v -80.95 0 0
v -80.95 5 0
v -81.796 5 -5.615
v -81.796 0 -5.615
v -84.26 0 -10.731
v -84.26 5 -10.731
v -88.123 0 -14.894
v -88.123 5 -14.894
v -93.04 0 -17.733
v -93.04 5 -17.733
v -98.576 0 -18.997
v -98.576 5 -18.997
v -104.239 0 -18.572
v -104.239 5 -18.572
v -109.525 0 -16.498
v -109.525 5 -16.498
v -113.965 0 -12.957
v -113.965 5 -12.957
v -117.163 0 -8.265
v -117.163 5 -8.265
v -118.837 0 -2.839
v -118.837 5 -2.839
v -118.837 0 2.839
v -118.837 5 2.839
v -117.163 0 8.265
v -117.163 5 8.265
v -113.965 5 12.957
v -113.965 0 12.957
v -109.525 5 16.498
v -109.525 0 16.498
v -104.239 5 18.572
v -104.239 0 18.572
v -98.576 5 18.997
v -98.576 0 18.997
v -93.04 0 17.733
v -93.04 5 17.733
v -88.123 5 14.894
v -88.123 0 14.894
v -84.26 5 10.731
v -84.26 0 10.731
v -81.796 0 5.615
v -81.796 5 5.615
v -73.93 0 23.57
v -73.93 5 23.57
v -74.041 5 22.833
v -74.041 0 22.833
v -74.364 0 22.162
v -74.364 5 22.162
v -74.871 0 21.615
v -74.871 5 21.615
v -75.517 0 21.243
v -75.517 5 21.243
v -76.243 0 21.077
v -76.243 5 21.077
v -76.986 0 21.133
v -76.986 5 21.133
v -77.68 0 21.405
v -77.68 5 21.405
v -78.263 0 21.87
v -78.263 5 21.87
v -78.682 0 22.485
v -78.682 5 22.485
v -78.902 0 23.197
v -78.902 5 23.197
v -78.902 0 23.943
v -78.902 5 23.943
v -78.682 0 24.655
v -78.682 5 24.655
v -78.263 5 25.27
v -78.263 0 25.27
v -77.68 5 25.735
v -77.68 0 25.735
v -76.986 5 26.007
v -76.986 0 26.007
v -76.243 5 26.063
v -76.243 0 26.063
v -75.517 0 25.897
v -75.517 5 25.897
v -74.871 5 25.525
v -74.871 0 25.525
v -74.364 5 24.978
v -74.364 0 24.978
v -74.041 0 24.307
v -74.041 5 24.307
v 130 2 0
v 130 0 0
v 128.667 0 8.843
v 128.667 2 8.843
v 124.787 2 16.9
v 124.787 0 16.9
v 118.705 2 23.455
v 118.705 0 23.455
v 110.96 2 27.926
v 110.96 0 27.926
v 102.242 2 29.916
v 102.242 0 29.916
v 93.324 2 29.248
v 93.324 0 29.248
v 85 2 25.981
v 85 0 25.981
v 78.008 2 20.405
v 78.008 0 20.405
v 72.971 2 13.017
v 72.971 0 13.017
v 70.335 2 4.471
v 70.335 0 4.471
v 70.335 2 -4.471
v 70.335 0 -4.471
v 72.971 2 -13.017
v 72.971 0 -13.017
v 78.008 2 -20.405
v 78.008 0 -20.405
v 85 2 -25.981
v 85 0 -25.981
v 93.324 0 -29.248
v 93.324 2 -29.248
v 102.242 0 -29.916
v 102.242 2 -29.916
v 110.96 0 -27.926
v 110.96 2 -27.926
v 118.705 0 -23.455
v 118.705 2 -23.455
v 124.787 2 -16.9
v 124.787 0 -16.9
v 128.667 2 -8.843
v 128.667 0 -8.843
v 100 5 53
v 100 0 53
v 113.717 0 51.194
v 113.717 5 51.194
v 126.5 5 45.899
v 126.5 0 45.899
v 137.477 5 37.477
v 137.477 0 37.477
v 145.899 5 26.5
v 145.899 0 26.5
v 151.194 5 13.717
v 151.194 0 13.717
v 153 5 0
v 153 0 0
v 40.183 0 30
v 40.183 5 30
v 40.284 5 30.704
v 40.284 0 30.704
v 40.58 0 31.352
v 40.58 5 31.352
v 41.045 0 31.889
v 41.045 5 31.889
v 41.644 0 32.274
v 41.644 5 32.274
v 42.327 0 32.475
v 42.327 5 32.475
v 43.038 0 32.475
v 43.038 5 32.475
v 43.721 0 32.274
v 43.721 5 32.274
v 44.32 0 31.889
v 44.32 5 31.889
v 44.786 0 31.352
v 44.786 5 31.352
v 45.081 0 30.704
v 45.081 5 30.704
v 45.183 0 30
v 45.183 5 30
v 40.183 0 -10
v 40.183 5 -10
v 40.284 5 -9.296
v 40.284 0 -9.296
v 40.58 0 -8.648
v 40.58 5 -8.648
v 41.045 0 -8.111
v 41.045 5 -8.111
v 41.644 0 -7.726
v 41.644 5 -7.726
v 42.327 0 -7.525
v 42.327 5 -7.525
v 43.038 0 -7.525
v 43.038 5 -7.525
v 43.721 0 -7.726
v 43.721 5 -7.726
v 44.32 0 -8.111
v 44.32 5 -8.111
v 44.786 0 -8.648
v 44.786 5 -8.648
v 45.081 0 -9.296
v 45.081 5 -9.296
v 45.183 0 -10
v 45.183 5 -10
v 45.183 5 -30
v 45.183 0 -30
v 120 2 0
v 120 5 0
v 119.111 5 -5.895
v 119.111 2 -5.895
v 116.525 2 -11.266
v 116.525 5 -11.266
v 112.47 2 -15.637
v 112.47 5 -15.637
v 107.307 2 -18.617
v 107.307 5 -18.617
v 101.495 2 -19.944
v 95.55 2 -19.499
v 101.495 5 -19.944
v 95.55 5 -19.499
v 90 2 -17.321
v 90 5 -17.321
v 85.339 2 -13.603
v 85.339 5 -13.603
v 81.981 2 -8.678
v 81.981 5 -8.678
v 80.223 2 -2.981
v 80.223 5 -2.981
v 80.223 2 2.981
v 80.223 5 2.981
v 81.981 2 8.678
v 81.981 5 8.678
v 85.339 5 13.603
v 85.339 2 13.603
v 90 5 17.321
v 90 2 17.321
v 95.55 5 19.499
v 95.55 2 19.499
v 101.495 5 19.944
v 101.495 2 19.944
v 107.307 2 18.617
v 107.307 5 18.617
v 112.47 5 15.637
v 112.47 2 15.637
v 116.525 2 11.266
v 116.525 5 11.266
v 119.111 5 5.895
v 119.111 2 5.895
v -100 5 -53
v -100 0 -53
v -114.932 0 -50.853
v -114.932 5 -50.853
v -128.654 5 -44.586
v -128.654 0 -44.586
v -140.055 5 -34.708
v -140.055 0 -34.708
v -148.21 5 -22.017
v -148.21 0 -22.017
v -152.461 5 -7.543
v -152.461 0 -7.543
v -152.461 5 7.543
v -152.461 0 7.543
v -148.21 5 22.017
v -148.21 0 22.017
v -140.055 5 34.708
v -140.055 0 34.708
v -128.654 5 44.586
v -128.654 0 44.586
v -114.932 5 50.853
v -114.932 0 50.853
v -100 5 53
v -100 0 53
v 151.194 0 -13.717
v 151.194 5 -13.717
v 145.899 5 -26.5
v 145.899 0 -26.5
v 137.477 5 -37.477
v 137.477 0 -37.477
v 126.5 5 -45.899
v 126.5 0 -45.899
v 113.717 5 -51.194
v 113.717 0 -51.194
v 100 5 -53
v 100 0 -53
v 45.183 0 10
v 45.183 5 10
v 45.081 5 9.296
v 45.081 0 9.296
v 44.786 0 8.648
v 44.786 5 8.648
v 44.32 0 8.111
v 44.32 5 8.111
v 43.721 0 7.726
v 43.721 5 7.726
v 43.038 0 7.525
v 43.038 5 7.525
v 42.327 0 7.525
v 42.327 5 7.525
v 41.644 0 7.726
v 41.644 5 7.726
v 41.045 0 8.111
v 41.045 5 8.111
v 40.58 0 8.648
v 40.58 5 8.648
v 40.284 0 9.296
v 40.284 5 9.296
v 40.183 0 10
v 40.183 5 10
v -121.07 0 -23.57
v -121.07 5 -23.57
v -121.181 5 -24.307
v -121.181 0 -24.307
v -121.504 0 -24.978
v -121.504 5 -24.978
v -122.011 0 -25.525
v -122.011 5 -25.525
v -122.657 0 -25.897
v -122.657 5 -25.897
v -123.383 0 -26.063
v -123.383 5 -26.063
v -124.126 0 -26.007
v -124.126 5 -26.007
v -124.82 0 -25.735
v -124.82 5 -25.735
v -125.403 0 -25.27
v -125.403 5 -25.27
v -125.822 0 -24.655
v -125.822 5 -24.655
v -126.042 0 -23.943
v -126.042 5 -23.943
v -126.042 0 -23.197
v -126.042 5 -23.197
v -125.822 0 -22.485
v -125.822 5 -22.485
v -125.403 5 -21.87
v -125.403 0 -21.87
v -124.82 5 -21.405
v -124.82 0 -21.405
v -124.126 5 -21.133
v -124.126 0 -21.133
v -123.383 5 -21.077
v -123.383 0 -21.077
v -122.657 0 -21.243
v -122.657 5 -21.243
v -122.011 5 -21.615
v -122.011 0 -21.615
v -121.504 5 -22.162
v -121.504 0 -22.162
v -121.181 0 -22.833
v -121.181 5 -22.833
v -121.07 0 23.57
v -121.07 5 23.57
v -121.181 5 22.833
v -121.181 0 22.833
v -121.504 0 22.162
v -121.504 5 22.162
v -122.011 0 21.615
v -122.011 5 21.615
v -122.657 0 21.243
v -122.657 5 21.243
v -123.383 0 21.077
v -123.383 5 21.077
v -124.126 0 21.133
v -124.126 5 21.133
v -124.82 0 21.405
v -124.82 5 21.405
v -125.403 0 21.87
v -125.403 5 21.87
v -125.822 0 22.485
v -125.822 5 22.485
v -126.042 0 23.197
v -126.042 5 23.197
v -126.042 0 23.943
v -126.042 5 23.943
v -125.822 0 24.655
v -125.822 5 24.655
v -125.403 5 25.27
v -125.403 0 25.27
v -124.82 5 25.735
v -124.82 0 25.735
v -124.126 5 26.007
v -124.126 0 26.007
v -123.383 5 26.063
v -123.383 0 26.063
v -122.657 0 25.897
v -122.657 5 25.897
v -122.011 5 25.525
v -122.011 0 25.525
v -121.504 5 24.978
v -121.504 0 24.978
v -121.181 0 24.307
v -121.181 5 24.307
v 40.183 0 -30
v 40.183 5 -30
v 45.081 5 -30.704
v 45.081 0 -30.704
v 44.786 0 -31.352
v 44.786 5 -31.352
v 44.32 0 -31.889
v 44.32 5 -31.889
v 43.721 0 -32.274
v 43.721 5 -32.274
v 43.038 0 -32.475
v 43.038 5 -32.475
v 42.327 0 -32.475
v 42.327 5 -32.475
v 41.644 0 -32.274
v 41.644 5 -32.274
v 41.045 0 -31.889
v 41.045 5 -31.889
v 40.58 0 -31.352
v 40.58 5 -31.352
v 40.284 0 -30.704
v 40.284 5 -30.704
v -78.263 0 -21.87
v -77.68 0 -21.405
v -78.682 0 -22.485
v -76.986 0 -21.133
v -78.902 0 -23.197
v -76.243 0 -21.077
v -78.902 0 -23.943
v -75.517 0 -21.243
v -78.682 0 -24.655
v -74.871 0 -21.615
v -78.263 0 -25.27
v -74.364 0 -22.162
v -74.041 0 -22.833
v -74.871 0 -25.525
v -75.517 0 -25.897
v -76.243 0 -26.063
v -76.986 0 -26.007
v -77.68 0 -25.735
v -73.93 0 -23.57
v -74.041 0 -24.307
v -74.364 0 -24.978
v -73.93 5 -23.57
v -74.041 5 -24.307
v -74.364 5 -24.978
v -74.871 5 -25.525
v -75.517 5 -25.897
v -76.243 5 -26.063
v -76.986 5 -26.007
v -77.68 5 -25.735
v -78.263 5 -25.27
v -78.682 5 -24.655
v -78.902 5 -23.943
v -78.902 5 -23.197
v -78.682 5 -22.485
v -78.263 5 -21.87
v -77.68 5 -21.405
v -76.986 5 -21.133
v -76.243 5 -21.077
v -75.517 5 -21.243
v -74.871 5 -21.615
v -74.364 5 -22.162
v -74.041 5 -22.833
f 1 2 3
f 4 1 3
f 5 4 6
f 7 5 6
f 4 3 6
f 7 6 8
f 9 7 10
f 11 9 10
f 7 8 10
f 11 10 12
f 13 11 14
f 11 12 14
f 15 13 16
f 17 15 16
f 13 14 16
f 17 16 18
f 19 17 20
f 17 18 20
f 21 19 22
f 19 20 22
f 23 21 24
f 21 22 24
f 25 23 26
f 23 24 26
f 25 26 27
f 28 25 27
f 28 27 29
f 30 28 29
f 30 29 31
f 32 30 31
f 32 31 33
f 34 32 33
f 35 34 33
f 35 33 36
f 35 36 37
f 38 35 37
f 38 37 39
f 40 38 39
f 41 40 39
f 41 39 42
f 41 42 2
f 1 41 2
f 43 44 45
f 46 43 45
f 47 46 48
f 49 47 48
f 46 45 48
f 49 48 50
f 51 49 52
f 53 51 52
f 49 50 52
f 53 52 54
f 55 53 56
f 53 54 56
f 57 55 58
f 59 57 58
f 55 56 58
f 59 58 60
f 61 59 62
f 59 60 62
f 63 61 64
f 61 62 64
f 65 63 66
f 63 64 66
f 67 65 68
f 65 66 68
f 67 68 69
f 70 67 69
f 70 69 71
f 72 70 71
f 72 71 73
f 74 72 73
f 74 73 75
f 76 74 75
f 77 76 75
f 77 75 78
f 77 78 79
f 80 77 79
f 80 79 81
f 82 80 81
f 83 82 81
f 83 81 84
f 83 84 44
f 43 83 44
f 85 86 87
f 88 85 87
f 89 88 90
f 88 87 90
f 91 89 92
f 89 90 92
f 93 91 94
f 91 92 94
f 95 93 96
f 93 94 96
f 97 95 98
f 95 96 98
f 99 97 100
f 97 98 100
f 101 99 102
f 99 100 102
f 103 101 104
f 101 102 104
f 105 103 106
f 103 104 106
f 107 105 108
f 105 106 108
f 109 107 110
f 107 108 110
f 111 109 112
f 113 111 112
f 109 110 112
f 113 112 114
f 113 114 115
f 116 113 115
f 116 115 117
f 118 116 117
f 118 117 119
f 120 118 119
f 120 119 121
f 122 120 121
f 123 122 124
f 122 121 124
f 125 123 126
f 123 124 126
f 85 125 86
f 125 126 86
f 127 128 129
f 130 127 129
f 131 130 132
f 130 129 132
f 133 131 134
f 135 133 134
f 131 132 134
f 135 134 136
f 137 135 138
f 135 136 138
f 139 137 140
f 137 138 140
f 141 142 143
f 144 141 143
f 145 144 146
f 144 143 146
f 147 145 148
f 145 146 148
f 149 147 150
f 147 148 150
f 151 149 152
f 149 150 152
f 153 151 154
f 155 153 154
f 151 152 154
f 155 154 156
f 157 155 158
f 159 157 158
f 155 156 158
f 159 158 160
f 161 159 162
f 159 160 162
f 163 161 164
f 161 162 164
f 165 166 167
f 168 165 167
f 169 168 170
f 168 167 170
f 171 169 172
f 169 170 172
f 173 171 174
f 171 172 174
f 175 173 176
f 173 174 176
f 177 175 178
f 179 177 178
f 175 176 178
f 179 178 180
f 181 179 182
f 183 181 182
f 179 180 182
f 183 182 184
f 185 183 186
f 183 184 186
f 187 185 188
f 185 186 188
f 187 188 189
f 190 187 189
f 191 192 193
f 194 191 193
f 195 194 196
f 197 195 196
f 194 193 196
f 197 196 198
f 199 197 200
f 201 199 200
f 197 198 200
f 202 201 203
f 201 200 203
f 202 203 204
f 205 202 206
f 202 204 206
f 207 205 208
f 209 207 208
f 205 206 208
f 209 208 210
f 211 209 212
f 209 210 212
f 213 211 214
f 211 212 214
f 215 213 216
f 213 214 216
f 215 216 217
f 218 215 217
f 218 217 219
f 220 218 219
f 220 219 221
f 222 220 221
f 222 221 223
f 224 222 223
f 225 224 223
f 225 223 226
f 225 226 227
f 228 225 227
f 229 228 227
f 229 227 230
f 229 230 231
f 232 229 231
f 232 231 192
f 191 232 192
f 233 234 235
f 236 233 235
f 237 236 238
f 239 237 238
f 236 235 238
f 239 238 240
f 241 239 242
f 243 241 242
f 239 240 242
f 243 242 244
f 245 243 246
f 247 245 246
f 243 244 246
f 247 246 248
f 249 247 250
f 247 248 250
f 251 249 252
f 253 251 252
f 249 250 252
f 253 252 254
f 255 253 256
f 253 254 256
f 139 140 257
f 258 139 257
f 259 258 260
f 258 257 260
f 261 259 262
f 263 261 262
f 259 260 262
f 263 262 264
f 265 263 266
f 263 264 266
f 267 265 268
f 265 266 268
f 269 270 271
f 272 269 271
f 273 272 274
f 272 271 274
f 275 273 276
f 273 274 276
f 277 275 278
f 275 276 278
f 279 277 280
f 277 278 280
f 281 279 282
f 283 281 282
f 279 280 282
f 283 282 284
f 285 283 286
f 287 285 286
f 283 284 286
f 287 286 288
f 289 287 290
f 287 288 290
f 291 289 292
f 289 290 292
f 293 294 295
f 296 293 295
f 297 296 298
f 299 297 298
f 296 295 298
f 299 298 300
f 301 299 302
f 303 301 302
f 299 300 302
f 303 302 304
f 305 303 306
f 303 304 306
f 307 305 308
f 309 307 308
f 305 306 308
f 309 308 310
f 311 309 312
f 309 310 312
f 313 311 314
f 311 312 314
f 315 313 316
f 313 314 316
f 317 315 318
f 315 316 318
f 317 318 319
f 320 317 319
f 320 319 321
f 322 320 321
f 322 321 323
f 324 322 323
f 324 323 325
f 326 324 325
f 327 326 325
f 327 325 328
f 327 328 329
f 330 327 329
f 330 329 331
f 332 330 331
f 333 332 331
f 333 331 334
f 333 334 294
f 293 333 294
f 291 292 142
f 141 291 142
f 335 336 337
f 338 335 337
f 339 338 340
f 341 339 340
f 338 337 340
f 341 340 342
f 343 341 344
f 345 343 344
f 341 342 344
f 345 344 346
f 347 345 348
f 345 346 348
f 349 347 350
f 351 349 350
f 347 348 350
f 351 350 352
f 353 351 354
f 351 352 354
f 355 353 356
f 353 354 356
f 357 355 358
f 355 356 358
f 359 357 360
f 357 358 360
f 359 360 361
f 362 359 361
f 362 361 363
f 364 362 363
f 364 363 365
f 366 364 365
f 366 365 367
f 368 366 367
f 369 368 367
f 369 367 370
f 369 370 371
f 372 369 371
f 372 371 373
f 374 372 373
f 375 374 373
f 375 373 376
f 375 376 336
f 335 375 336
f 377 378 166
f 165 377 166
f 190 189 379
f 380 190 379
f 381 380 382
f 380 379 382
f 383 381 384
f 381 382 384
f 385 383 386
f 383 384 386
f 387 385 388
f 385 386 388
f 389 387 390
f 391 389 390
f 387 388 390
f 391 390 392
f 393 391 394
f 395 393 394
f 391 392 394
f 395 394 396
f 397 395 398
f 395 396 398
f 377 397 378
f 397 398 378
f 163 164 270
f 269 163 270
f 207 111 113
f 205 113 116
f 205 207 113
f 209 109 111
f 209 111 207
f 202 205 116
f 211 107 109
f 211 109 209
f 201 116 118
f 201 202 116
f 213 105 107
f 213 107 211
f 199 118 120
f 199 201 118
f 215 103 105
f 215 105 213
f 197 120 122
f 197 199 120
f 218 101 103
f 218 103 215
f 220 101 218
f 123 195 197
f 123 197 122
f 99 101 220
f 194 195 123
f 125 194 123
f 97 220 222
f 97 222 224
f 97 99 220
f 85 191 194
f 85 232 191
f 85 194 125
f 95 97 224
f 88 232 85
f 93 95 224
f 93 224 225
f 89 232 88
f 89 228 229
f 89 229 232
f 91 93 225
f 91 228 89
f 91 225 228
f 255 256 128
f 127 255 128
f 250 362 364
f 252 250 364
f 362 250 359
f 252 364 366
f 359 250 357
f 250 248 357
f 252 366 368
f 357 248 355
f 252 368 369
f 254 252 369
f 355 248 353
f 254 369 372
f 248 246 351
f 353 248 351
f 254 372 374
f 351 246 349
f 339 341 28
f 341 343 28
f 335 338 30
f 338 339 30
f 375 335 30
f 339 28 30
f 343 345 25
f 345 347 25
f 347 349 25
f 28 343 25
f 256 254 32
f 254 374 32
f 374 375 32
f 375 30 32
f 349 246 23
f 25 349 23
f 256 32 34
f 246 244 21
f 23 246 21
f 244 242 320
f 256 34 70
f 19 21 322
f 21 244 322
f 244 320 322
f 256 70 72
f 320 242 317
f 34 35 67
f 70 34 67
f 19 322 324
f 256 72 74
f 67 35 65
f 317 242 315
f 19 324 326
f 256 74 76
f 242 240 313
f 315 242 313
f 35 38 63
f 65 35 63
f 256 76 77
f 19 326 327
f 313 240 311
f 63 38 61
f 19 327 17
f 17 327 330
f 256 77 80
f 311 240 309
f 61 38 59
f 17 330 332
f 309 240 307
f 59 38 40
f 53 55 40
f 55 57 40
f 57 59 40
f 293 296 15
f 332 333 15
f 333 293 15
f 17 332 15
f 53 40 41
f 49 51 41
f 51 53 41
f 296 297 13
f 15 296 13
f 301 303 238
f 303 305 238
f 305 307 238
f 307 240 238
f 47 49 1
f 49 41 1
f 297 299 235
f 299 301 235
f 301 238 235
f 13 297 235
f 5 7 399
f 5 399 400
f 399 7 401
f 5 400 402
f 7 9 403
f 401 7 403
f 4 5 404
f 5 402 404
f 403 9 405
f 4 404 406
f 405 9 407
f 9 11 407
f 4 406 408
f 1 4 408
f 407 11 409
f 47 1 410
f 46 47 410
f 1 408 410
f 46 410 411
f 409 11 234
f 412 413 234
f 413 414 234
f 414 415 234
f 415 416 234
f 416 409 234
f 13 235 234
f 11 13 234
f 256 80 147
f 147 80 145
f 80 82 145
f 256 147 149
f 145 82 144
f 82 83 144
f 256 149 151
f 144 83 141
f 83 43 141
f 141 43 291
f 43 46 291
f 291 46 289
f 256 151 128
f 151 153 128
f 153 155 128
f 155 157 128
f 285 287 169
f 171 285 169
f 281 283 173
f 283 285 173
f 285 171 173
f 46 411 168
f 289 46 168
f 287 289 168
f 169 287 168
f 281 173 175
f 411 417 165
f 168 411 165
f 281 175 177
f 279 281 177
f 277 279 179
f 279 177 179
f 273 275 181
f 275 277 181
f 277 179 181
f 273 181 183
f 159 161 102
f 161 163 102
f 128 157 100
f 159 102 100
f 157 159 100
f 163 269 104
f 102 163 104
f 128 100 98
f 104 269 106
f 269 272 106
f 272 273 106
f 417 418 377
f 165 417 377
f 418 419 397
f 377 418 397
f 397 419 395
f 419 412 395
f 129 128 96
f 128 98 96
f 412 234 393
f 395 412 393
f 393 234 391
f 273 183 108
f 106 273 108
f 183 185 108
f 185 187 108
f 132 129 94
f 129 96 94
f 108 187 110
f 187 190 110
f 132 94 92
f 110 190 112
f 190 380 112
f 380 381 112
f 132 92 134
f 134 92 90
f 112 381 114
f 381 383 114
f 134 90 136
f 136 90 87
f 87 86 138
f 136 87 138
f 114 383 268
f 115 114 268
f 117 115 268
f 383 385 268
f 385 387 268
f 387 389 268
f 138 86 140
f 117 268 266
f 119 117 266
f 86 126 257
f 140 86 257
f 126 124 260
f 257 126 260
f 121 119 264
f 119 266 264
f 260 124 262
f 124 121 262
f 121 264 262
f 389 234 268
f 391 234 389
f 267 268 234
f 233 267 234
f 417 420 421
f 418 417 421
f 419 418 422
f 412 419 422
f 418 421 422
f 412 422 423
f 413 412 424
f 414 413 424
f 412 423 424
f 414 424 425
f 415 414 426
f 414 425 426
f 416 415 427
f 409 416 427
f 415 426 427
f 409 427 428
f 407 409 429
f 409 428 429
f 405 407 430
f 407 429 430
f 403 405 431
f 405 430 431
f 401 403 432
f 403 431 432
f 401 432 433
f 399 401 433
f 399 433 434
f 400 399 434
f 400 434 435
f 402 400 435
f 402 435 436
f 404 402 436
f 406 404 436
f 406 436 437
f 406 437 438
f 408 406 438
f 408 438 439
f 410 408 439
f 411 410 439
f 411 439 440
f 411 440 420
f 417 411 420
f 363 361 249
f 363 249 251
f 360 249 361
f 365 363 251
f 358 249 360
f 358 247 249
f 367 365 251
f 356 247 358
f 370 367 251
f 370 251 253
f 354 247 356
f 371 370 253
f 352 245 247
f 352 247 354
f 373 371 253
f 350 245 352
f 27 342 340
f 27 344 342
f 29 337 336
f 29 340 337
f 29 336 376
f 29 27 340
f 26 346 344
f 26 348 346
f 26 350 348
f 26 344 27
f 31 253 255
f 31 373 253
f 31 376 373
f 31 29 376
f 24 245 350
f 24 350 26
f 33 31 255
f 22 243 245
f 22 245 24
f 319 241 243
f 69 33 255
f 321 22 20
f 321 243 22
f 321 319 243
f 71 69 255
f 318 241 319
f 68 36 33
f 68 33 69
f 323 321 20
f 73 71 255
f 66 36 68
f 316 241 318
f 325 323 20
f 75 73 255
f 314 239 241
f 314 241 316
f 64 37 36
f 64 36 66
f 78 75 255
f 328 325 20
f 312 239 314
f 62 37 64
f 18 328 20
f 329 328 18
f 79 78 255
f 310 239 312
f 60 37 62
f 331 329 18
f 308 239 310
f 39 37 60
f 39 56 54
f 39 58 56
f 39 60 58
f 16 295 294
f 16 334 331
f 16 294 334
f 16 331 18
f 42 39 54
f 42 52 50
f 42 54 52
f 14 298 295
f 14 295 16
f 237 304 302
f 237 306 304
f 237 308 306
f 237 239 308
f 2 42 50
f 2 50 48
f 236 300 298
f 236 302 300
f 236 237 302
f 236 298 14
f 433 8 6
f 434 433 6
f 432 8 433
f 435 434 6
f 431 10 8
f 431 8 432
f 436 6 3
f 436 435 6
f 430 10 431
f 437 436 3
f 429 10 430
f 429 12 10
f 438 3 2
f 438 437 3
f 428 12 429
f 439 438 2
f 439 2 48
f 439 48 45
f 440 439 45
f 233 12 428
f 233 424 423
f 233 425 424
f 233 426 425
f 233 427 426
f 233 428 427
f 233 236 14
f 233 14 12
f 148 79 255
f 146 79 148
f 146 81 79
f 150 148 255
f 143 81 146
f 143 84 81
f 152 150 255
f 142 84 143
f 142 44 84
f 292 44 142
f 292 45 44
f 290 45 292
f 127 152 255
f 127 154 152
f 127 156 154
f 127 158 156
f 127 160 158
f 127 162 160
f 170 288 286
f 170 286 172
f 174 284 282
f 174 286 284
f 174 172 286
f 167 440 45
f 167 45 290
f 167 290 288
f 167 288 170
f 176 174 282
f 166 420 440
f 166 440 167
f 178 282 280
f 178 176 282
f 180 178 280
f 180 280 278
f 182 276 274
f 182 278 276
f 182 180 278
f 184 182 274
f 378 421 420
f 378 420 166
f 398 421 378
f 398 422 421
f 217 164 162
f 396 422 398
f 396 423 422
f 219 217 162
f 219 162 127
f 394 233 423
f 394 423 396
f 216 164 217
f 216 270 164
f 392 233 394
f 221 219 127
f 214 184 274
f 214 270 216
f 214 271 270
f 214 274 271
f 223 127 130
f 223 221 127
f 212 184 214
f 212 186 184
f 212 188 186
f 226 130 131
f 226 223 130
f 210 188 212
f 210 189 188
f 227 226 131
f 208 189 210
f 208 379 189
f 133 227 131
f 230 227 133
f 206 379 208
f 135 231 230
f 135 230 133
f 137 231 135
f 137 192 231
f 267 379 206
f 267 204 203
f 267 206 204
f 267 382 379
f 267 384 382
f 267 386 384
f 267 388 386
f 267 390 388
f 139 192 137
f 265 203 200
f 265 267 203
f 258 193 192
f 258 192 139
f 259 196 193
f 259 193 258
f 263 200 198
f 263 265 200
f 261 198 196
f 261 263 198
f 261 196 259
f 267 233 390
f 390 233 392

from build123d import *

# Parameters (mm, degrees)
BOSS_EXTRUDE1_DEPTH = 5
SKETCH2_R           = 20
CUT_EXTRUDE1_DEPTH  = 6
SKETCH3_R           = 30
CUT_EXTRUDE2_DEPTH  = 2
SKETCH4_R           = 2.5
SKETCH4_R_2         = 19.05
CUT_EXTRUDE3_DEPTH  = 6


with BuildPart() as part:
    # Sketch1 → Boss-Extrude1 (new body)
    with BuildSketch(Plane(origin=(0, 0, 0), x_dir=(1, 0, 0), z_dir=(0, 1, 0))):
        with BuildLine():
            ThreePointArc((-100, 53), (-153, 0), (-100, -53))
            Line((-100, -53), (-100, 53))
        make_face()
        with BuildLine():
            Line((-100, 53), (-100, -53))
            ThreePointArc((-100, -53), (-62.523340597, -37.476659403), (-47, 0))
            ThreePointArc((-47, 0), (-62.523340597, 37.476659403), (-100, 53))
        make_face()
        with BuildLine():
            ThreePointArc((-47, 0), (-62.523340597, -37.476659403), (-100, -53))
            Line((-100, -53), (100, -53))
            ThreePointArc((100, -53), (47, 0), (100, 53))
            Line((100, 53), (-100, 53))
            ThreePointArc((-100, 53), (-62.523340597, 37.476659403), (-47, 0))
        make_face()
        with BuildLine():
            ThreePointArc((100, 53), (47, 0), (100, -53))
            Line((100, -53), (100, 53))
        make_face()
        with BuildLine():
            Line((100, 53), (100, -53))
            ThreePointArc((100, -53), (137.476659403, -37.476659403), (153, 0))
            ThreePointArc((153, 0), (137.476659403, 37.476659403), (100, 53))
        make_face()
    extrude(amount=BOSS_EXTRUDE1_DEPTH)

    # Sketch2 → Cut-Extrude1 (cut, through all)
    with BuildSketch(Plane(origin=(0, 5, 0), x_dir=(1, 0, 0), z_dir=(0, 1, 0))):
        with Locations((100, 0)):
            Circle(SKETCH2_R)
    extrude(amount=-CUT_EXTRUDE1_DEPTH, mode=Mode.SUBTRACT)

    # Sketch3 → Cut-Extrude2 (cut)
    with BuildSketch(Plane.XZ):
        with Locations((100, 0)):
            Circle(SKETCH3_R)
    extrude(amount=-CUT_EXTRUDE2_DEPTH, mode=Mode.SUBTRACT)

    # Sketch4 → Cut-Extrude3 (cut, through all)
    with BuildSketch(Plane(origin=(0, 5, 0), x_dir=(1, 0, 0), z_dir=(0, 1, 0))):
        with Locations((-123.57, 23.57)):
            Circle(SKETCH4_R)
        with Locations((-76.43, 23.57)):
            Circle(SKETCH4_R)
        with Locations((-76.43, -23.57)):
            Circle(SKETCH4_R)
        with Locations((-123.57, -23.57)):
            Circle(SKETCH4_R)
        with Locations((-100, 0)):
            Circle(SKETCH4_R_2)
        with BuildLine():
            Line((45.182638641, 10), (45.182638641, 30))
            ThreePointArc((45.182638641, 30), (42.682638641, 32.5), (40.182638641, 30))
            Line((40.182638641, 30), (40.182638641, 10))
            ThreePointArc((40.182638641, 10), (42.682638641, 7.5), (45.182638641, 10))
        make_face()
        with BuildLine():
            Line((40.182638641, -10), (40.182638641, -30))
            ThreePointArc((40.182638641, -30), (42.682638641, -32.5), (45.182638641, -30))
            Line((45.182638641, -30), (45.182638641, -10))
            ThreePointArc((45.182638641, -10), (42.682638641, -7.5), (40.182638641, -10))
        make_face()
    extrude(amount=-CUT_EXTRUDE3_DEPTH, mode=Mode.SUBTRACT)


solid = part.part
